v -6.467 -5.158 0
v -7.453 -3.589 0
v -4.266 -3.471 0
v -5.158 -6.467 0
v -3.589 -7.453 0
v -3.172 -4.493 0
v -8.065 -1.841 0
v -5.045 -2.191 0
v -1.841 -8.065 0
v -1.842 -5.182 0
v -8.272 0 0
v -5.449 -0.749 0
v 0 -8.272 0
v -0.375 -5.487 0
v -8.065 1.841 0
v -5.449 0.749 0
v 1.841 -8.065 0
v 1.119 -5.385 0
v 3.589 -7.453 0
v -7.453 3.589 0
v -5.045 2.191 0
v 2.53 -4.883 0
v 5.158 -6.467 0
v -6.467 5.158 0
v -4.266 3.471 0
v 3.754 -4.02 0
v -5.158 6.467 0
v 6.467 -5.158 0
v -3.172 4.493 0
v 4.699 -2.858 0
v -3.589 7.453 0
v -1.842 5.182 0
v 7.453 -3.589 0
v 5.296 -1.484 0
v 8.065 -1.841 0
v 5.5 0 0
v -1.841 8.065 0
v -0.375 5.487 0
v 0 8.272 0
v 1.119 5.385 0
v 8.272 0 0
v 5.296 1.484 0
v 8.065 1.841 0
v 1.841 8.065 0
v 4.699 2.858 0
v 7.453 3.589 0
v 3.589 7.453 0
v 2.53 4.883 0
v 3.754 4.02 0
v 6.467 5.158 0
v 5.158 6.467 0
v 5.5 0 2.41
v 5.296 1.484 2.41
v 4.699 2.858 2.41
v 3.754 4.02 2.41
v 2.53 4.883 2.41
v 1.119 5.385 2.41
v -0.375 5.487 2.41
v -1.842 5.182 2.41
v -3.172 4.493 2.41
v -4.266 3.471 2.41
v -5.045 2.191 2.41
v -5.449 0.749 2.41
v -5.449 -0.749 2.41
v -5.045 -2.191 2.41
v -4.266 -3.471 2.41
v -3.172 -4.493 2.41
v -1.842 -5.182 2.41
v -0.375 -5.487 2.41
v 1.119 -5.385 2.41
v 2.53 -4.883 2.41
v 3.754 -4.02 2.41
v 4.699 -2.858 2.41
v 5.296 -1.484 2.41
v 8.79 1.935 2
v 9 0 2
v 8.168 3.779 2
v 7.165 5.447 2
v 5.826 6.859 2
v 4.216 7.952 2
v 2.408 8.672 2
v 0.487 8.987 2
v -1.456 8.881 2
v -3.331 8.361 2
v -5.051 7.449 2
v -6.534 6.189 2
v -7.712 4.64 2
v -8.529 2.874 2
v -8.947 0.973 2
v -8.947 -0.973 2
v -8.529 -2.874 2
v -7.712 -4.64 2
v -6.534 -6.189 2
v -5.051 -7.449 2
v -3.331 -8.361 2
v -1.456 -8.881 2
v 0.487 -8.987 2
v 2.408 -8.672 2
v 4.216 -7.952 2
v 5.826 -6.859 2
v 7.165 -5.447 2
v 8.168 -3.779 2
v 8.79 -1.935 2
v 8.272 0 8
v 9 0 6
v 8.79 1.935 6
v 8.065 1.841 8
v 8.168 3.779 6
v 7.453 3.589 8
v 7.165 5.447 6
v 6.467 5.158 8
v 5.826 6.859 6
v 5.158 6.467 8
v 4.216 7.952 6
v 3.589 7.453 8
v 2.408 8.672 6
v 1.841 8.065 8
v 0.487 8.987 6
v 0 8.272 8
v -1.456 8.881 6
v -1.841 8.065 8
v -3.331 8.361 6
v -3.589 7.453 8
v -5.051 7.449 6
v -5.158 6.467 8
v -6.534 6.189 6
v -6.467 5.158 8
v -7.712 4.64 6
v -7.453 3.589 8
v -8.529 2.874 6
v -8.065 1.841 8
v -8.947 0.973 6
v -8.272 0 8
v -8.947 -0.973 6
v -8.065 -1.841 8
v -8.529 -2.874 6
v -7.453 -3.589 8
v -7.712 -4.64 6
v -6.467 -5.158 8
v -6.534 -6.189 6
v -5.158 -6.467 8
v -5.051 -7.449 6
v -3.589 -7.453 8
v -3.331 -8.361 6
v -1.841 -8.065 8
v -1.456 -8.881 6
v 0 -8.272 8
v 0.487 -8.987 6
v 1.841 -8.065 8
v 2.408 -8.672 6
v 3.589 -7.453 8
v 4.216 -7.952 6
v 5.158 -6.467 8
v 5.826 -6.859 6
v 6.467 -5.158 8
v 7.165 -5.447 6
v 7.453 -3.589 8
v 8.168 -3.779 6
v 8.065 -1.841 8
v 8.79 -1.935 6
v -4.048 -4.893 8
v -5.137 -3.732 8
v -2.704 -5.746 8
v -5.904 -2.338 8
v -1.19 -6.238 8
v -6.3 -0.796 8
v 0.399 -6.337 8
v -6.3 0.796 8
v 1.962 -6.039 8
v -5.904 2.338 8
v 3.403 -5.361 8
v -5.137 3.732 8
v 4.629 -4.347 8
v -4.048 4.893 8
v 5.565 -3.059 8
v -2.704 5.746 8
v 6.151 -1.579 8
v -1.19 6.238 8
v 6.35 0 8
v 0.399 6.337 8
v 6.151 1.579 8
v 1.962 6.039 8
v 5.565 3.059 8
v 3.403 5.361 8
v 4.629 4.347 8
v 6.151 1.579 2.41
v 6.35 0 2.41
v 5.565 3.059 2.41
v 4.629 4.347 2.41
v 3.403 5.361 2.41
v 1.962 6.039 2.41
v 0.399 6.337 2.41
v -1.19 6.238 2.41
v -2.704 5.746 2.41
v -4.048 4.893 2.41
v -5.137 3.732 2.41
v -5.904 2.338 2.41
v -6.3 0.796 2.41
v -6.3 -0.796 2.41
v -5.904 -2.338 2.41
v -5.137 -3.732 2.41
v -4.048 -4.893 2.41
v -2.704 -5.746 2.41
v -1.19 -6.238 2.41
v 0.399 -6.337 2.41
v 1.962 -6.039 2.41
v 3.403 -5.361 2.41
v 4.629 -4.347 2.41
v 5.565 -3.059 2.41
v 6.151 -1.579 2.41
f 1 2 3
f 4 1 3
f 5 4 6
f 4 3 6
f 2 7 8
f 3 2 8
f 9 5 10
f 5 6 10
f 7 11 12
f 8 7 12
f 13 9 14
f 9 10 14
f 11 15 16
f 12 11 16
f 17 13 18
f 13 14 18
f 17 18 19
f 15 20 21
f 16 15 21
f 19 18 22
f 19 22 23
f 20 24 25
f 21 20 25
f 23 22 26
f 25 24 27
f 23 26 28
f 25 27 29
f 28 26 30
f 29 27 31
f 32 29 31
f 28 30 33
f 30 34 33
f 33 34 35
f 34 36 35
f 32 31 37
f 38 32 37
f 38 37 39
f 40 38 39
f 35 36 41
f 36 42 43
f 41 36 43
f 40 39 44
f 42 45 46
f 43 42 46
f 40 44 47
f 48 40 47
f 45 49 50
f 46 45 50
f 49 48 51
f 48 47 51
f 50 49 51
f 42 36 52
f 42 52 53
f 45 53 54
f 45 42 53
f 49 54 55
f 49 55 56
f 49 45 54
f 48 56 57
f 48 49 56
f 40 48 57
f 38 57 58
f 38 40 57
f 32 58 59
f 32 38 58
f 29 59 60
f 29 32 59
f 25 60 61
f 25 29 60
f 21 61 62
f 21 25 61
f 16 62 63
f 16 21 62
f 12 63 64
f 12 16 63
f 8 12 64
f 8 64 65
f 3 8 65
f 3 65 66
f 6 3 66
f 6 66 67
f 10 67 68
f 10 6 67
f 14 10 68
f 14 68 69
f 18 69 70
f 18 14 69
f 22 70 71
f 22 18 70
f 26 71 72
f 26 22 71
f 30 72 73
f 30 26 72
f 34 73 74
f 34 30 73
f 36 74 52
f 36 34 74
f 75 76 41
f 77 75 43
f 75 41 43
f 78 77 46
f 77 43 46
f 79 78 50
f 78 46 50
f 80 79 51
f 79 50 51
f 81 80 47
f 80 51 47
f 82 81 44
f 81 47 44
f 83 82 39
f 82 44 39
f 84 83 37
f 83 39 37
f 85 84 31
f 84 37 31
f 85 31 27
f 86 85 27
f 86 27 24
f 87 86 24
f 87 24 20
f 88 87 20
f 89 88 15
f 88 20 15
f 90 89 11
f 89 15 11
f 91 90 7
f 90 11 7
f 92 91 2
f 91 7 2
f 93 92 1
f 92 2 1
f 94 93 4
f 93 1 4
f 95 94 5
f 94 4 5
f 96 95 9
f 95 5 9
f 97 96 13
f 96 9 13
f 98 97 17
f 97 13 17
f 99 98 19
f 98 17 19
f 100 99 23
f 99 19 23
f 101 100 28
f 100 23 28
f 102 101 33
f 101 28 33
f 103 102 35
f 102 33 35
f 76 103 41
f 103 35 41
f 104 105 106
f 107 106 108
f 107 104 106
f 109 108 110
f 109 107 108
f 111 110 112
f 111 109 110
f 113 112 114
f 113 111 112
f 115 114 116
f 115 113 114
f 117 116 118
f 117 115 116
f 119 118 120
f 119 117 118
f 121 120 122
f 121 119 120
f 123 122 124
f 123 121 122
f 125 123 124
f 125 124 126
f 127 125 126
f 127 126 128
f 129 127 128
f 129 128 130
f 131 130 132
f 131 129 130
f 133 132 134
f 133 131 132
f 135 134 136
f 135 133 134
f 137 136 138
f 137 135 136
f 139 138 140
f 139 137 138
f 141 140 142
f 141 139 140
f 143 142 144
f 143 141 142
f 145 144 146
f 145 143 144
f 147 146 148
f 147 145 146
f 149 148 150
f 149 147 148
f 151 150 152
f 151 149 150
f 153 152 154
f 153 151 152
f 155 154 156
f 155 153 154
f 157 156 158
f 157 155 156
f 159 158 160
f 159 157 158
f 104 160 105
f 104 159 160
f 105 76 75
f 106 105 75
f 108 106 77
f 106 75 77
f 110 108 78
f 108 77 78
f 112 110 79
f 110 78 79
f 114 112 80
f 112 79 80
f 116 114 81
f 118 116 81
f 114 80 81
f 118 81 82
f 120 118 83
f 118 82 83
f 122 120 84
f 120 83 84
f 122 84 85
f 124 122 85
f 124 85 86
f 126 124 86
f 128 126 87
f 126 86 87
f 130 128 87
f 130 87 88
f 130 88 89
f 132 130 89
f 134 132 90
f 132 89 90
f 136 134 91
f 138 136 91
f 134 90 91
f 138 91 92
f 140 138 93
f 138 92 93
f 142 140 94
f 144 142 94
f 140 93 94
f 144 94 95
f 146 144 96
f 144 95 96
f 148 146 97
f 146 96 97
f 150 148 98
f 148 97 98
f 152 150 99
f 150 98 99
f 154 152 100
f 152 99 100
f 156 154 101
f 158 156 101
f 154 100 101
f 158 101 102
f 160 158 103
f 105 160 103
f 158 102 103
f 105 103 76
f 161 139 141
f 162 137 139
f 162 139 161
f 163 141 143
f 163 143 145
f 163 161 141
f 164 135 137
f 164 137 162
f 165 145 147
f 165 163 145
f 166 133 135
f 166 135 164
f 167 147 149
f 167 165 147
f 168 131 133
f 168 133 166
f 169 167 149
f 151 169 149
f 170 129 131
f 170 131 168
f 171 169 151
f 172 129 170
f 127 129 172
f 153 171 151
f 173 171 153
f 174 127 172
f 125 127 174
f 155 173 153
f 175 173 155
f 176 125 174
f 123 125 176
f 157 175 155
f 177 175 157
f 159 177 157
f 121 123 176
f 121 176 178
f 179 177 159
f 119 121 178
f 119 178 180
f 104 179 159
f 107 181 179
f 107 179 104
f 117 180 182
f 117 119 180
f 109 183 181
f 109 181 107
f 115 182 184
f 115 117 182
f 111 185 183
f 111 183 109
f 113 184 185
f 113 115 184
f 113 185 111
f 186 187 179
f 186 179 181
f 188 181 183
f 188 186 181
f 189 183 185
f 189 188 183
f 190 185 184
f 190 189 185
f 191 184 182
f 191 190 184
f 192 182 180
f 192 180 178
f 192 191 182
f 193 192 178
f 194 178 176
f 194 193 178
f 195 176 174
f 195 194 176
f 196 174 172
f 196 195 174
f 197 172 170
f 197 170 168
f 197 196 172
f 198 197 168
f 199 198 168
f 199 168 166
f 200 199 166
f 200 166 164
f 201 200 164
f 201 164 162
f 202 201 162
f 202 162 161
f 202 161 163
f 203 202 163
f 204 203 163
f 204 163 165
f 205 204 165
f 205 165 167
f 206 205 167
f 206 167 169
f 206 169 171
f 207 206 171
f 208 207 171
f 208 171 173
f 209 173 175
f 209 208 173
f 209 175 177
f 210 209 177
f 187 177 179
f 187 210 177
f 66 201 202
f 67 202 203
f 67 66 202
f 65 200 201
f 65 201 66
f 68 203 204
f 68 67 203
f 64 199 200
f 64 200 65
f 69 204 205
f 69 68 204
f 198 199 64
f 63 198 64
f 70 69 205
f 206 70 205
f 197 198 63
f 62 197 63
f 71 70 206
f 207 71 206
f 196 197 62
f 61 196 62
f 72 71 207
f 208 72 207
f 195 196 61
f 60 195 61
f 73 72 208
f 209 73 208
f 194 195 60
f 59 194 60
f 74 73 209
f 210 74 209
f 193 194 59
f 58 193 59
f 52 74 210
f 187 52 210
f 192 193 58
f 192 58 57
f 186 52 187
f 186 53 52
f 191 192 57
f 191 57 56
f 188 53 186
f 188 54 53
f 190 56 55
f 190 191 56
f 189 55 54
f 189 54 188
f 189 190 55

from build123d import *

# Parameters (mm, degrees)
F0_R     = 6.35
F0_R_2   = 5.5
F1_DEPTH = 2.41
F0_R_3   = 9
F2_DEPTH = 8
F3_SIZE2 = 0.72794
F3_SIZE  = 2
F4_SIZE2 = 0.72794
F4_SIZE  = 2


with BuildPart() as f1:
    # F0 (on Top) → F1 (new body)
    with BuildSketch(Plane.XY):
        Circle(F0_R)
        Circle(F0_R_2, mode=Mode.SUBTRACT)
    extrude(amount=F1_DEPTH)

    # F0 (on Top) → F2 (join)
    with BuildSketch(Plane.XY):
        Circle(F0_R_3)
        Circle(F0_R, mode=Mode.SUBTRACT)
    extrude(amount=F2_DEPTH)

    # F3
    f3_edges = [f1.edges().sort_by_distance(p)[0] for p in [
        (-9, 0, 0),
    ]]
    chamfer(f3_edges, length=F3_SIZE, length2=F3_SIZE2)

    # F4
    f4_edges = [f1.edges().sort_by_distance(p)[0] for p in [
        (-9, 0, 8),
    ]]
    chamfer(f4_edges, length=F4_SIZE, length2=F4_SIZE2)


solid = f1.part
